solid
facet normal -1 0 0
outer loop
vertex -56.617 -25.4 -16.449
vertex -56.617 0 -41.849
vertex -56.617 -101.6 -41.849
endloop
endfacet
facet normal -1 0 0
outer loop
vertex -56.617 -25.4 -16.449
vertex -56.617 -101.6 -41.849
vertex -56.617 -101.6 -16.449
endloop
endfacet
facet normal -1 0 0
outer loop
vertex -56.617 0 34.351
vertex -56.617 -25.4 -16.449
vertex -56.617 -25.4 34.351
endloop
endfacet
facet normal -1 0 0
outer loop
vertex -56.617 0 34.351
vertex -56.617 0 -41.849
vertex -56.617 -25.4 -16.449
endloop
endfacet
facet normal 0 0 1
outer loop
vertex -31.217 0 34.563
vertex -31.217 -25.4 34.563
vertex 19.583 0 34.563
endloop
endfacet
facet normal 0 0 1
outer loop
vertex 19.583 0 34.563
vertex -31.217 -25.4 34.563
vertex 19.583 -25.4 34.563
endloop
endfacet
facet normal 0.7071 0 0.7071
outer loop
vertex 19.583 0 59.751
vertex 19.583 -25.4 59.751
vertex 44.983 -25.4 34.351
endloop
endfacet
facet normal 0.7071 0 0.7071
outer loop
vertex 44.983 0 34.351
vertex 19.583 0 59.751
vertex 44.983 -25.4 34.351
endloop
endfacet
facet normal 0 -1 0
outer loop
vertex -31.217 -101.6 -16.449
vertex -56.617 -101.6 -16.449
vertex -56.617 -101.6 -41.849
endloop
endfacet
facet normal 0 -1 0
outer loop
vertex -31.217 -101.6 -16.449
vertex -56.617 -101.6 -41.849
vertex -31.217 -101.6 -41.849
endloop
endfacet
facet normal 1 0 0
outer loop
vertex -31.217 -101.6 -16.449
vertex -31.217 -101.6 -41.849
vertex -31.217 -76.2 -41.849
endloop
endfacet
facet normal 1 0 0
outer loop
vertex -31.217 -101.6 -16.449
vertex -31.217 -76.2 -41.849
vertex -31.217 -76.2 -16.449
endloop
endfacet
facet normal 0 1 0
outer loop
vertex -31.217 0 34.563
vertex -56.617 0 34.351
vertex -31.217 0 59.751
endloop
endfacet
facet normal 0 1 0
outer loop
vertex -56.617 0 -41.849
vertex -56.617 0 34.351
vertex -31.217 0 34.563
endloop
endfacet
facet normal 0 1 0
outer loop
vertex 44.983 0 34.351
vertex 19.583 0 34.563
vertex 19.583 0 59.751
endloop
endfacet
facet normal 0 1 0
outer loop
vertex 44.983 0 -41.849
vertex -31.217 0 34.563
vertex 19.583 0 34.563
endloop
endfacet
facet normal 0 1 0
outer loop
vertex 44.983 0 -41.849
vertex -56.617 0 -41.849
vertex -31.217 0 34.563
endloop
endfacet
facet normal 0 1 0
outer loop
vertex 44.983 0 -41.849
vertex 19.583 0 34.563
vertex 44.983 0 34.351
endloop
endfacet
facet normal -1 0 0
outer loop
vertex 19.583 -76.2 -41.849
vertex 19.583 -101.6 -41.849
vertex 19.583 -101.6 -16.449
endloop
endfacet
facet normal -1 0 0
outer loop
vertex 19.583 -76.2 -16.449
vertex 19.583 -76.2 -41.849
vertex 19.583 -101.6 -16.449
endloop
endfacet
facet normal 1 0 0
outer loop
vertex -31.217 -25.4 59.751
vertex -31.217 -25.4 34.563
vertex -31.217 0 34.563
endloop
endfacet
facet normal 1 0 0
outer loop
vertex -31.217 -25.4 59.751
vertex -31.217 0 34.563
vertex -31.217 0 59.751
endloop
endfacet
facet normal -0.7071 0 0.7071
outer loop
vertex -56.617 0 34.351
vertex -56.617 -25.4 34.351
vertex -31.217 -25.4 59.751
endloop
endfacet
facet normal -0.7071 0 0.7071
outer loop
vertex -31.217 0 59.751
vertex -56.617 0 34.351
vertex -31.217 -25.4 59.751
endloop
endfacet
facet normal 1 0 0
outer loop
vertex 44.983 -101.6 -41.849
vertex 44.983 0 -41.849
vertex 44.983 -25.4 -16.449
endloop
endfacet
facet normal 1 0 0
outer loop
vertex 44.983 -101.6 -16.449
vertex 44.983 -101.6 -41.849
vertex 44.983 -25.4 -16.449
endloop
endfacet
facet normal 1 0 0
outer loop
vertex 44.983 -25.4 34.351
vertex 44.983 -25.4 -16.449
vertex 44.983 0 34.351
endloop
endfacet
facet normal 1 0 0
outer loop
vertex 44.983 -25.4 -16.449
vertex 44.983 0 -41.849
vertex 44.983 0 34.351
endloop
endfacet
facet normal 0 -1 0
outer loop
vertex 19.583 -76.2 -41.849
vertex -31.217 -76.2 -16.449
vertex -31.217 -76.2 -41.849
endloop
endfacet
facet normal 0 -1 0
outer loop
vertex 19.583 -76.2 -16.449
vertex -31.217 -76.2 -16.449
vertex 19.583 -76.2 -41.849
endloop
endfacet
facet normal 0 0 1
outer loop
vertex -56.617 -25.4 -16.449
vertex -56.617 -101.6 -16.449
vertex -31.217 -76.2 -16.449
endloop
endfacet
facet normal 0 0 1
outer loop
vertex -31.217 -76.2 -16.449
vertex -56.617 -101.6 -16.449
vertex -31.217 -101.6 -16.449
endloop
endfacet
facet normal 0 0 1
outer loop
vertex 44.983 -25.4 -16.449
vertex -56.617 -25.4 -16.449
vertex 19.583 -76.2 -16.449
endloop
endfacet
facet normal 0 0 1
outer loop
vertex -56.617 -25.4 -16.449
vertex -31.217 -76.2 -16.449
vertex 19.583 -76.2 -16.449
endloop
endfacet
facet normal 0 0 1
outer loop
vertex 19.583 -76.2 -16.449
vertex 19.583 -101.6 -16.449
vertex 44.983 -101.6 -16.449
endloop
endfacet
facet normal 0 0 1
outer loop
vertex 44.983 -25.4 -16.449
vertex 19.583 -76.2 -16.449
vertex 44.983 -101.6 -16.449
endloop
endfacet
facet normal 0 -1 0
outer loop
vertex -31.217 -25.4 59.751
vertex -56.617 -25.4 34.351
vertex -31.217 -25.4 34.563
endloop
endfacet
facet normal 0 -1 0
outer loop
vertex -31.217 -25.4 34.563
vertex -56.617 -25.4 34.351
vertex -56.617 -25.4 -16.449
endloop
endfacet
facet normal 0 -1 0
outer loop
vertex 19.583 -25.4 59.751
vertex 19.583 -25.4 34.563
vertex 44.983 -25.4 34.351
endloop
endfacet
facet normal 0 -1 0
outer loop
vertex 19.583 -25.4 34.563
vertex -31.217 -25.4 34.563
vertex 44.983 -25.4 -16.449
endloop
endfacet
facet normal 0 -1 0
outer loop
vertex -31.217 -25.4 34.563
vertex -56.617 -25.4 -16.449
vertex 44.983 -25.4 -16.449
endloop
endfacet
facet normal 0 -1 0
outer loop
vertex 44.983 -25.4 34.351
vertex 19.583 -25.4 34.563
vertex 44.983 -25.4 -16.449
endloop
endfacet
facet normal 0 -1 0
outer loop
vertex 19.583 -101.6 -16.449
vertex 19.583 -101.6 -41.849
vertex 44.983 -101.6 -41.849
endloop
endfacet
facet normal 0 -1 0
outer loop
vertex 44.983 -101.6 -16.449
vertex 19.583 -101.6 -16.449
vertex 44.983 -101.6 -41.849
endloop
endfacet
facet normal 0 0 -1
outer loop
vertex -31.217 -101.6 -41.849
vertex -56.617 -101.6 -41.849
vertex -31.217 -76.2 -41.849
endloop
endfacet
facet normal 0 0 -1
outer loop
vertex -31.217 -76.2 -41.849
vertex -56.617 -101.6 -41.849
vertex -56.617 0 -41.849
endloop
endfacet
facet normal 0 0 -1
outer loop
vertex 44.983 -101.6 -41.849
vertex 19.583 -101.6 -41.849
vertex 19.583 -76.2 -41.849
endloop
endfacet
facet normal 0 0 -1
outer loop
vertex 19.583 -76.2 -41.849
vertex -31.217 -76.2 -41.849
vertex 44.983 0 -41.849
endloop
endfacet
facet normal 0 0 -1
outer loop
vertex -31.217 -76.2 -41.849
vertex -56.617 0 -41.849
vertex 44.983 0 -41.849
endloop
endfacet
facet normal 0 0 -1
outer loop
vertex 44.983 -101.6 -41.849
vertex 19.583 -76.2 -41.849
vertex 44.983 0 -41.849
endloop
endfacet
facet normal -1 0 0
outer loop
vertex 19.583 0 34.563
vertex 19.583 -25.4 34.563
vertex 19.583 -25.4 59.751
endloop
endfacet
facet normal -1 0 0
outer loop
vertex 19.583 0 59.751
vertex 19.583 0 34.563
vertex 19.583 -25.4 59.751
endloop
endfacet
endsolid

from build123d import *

# Parameters (mm, degrees)
F0_W      = 101.6
F0_H      = 101.6
F1_DEPTH  = 101.6
F2_W      = 50.8
F2_H      = 25.4
F3_DEPTH  = 25.4
F4_W      = 101.6
F4_H      = 76.2
F5_DEPTH  = 76.2
F7_DEPTH  = 25.4
F8_W      = 50.8
F8_H      = 50.8
F9_DEPTH  = 25.4
F9_FACE_W = 50.8
F9_FACE_H = 25.4
F10_DEPTH = 50.8
F11_W     = 50.8
F11_H     = 25.188574
F12_DEPTH = 59.436


with BuildPart() as f1:
    # F0 (on Front) → F1 (new body)
    with BuildSketch(Plane.XZ):
        with Locations((-5.817418, 8.951449)):
            Rectangle(F0_W, F0_H)
    extrude(amount=F1_DEPTH)

    # F2 (on face) → F3 (cut)
    with BuildSketch(Plane.XZ.offset(101.6)):
        with Locations((-5.817418, -29.148551)):
            Rectangle(F2_W, F2_H)
    extrude(amount=-F3_DEPTH, mode=Mode.SUBTRACT)

    # F4 (on face) → F5 (cut)
    with BuildSketch(Plane.XZ.offset(101.6)):
        with Locations((-5.817418, 21.651449)):
            Rectangle(F4_W, F4_H)
    extrude(amount=-F5_DEPTH, mode=Mode.SUBTRACT)

    # F6 (on face) → F7 (cut)
    with BuildSketch(Plane.XZ.offset(25.4)):
        Polygon((44.982582, 59.751449), (19.582582, 59.751449), (44.982582, 34.351449), align=None)
        Polygon((-31.217418, 59.751449), (-56.617418, 59.751449), (-56.617418, 34.351449), align=None)
    extrude(amount=-F7_DEPTH, mode=Mode.SUBTRACT)

    # F8 (on face) → F9 (cut)
    with BuildSketch(Plane.XZ.offset(25.4)):
        with Locations((-5.817418, 34.351449)):
            Rectangle(F8_W, F8_H)
    extrude(amount=-F9_DEPTH, mode=Mode.SUBTRACT)

    # F9_face (on face) → F10 (join)
    with BuildSketch(Plane(origin=(-5.817418, -12.7, 8.951449), x_dir=(1, 0, 0), z_dir=(0, 0, 1))):
        Rectangle(F9_FACE_W, F9_FACE_H)
    extrude(amount=F10_DEPTH)

    # F11 (on face) → F12 (cut)
    with BuildSketch(Plane.XZ.offset(25.4)):
        with Locations((-5.817418, 47.157162)):
            Rectangle(F11_W, F11_H)
    extrude(amount=-F12_DEPTH, mode=Mode.SUBTRACT)


solid = f1.part
